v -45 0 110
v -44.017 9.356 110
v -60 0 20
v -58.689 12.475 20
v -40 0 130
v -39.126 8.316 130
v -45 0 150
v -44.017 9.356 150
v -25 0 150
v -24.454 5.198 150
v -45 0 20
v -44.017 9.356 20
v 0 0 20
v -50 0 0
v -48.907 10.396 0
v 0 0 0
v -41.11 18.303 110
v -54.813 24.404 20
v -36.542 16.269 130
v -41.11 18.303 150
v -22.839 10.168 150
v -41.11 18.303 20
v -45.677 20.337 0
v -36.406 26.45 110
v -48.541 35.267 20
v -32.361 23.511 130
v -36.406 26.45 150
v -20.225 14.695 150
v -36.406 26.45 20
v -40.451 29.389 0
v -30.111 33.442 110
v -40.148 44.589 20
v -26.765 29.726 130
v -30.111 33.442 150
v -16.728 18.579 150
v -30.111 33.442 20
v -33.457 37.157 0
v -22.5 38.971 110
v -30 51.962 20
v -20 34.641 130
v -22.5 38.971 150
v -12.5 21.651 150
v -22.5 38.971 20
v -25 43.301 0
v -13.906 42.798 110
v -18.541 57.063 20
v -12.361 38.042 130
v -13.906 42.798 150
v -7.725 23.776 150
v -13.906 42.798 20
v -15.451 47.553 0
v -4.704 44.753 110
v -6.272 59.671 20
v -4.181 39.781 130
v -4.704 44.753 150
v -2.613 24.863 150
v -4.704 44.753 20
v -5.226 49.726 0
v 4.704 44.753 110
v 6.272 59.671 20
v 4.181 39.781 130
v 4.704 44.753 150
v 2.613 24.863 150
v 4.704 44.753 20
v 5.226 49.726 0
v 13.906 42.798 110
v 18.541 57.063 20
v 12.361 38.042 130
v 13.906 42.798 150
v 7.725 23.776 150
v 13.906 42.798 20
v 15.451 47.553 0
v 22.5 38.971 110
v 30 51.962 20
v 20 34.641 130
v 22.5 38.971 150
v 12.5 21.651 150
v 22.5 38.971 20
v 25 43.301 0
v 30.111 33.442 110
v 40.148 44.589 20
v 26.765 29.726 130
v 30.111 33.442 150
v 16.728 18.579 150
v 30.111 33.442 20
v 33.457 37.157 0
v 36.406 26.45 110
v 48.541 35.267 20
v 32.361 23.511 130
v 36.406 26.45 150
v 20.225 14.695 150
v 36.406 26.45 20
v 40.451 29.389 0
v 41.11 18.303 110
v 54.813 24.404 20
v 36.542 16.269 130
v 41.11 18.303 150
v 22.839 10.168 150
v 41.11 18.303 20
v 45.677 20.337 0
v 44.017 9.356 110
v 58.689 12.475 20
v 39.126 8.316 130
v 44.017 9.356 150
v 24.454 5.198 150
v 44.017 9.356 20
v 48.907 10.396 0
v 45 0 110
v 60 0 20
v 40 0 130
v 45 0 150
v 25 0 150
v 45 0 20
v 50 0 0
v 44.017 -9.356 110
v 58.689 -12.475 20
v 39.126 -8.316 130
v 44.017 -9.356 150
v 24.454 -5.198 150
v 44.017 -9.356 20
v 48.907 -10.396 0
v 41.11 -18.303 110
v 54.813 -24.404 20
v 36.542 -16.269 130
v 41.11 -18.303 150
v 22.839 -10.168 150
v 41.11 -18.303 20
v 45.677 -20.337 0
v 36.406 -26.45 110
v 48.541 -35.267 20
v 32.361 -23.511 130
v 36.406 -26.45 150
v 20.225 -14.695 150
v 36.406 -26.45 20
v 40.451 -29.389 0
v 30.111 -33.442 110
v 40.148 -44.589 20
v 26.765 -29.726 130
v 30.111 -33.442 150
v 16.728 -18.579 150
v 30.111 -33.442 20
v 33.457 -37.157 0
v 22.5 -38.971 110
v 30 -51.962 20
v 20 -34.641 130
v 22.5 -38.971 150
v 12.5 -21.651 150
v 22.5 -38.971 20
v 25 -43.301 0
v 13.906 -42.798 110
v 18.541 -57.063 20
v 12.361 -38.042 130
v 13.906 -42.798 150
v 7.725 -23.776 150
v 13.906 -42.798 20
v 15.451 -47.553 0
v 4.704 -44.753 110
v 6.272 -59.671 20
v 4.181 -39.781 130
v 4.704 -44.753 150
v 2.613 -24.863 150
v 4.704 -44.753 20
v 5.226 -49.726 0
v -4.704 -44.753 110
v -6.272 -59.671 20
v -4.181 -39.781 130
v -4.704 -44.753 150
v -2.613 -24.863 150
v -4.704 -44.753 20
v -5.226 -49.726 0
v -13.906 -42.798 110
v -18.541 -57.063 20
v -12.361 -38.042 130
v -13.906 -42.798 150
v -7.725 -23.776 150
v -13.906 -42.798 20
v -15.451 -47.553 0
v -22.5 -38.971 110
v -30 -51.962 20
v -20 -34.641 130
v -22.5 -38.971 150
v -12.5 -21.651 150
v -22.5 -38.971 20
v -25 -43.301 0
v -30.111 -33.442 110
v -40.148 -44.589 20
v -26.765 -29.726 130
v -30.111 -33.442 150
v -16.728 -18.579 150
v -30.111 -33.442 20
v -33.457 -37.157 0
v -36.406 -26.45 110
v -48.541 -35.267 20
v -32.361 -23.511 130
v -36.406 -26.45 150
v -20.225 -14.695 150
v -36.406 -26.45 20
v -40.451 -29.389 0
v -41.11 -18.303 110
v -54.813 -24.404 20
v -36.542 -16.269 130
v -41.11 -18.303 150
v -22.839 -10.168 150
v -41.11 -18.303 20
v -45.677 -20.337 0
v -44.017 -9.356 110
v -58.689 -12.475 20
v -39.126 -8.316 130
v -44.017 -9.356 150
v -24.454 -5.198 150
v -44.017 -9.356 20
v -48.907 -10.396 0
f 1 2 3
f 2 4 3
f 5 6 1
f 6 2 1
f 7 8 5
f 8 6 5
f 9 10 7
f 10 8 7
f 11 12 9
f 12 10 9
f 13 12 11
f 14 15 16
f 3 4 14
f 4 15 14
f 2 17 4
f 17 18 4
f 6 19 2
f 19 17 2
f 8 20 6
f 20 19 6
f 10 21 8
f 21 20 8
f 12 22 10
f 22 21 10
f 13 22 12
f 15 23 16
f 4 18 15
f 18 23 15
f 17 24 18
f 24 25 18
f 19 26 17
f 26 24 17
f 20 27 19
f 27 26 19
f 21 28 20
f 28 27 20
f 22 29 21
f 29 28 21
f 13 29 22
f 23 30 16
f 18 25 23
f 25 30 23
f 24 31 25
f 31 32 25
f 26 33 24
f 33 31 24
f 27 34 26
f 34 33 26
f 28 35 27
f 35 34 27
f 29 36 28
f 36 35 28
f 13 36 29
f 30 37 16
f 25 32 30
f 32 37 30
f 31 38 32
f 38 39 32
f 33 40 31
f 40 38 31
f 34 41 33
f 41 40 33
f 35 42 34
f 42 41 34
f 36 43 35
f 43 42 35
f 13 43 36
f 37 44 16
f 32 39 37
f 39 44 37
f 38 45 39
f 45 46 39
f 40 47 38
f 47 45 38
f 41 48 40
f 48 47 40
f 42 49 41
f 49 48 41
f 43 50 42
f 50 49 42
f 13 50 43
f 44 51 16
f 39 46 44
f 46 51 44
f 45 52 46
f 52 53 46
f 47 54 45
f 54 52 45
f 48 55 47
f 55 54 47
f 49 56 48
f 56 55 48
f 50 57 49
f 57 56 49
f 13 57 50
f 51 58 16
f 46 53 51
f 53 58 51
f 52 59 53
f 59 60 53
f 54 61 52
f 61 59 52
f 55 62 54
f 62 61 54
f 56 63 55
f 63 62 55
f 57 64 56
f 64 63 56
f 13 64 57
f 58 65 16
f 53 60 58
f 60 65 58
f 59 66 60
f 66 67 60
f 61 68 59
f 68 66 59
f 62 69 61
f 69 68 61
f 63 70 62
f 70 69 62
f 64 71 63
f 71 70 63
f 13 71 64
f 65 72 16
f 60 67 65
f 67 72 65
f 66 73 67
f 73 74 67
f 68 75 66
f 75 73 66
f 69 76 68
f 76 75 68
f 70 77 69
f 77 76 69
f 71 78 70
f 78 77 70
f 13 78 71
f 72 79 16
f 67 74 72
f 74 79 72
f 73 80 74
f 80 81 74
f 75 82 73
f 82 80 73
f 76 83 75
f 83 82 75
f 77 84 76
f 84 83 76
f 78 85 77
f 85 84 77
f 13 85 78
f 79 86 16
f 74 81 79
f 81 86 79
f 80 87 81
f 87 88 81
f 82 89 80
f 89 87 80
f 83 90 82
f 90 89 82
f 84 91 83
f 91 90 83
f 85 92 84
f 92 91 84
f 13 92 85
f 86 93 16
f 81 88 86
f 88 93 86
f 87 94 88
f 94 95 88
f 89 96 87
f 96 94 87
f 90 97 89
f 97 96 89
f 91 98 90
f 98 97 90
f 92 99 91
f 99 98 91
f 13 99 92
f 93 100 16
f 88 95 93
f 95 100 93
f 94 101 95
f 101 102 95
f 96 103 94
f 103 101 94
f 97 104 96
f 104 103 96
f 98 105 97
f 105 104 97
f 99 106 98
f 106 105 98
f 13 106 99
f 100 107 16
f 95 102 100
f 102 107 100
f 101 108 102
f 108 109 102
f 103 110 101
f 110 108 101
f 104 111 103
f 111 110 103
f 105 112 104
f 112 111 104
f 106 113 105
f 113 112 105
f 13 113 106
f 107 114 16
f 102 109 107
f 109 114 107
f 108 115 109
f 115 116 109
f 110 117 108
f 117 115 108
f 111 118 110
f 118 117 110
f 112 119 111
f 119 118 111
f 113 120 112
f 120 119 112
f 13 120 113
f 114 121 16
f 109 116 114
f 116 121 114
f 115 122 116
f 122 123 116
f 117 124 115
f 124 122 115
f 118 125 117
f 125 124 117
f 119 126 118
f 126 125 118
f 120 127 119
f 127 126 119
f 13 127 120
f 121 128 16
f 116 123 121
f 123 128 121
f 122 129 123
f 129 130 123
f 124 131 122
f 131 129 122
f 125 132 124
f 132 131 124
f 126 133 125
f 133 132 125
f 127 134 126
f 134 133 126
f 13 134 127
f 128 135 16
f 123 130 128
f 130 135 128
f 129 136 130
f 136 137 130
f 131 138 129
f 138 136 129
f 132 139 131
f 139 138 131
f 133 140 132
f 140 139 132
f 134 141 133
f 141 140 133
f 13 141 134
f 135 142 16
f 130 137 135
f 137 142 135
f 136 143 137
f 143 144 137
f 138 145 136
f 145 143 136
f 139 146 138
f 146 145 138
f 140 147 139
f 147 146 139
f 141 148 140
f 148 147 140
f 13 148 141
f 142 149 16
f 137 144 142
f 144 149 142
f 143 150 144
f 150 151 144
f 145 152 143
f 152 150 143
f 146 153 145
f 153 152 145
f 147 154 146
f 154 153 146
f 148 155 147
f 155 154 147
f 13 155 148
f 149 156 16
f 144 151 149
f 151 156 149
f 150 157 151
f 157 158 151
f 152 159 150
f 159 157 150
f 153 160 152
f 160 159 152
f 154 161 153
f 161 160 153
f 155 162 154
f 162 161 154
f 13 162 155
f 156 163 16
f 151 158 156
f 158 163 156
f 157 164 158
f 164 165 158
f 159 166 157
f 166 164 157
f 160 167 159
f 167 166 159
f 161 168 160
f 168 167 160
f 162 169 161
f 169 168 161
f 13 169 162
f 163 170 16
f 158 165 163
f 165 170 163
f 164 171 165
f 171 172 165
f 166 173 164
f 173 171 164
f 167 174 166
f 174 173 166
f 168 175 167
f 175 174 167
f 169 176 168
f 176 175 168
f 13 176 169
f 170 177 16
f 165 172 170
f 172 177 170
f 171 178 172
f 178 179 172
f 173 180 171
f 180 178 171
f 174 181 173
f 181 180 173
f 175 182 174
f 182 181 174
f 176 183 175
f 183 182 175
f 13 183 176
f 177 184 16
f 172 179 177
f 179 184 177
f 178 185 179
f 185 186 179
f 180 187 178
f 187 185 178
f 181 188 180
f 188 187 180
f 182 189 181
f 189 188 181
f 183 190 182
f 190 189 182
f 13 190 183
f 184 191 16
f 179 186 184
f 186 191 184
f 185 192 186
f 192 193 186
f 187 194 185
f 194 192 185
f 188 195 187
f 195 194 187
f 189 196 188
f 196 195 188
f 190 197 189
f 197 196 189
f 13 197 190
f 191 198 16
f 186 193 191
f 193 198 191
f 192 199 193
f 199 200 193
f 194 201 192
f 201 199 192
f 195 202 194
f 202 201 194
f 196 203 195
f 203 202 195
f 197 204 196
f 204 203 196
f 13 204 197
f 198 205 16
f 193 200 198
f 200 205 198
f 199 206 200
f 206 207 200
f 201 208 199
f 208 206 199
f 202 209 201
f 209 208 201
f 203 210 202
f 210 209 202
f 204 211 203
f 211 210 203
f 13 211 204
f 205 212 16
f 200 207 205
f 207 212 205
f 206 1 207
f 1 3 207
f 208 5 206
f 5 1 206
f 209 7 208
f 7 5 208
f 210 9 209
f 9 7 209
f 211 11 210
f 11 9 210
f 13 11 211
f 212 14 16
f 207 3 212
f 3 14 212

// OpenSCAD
// Profilkurve
polygon_points = [
    [-30, 0], [20, 0], [30, 20], [25, 50], [20, 80], [15, 110], [10, 130], [15, 150], [-5, 150], [15, 20], [-30, 20]
];

// Rotieren der Profilkurve um die Z-Achse
module vase() {
    rotate_extrude()
        translate([30, 0, 0])
            polygon(polygon_points);
}

vase();
